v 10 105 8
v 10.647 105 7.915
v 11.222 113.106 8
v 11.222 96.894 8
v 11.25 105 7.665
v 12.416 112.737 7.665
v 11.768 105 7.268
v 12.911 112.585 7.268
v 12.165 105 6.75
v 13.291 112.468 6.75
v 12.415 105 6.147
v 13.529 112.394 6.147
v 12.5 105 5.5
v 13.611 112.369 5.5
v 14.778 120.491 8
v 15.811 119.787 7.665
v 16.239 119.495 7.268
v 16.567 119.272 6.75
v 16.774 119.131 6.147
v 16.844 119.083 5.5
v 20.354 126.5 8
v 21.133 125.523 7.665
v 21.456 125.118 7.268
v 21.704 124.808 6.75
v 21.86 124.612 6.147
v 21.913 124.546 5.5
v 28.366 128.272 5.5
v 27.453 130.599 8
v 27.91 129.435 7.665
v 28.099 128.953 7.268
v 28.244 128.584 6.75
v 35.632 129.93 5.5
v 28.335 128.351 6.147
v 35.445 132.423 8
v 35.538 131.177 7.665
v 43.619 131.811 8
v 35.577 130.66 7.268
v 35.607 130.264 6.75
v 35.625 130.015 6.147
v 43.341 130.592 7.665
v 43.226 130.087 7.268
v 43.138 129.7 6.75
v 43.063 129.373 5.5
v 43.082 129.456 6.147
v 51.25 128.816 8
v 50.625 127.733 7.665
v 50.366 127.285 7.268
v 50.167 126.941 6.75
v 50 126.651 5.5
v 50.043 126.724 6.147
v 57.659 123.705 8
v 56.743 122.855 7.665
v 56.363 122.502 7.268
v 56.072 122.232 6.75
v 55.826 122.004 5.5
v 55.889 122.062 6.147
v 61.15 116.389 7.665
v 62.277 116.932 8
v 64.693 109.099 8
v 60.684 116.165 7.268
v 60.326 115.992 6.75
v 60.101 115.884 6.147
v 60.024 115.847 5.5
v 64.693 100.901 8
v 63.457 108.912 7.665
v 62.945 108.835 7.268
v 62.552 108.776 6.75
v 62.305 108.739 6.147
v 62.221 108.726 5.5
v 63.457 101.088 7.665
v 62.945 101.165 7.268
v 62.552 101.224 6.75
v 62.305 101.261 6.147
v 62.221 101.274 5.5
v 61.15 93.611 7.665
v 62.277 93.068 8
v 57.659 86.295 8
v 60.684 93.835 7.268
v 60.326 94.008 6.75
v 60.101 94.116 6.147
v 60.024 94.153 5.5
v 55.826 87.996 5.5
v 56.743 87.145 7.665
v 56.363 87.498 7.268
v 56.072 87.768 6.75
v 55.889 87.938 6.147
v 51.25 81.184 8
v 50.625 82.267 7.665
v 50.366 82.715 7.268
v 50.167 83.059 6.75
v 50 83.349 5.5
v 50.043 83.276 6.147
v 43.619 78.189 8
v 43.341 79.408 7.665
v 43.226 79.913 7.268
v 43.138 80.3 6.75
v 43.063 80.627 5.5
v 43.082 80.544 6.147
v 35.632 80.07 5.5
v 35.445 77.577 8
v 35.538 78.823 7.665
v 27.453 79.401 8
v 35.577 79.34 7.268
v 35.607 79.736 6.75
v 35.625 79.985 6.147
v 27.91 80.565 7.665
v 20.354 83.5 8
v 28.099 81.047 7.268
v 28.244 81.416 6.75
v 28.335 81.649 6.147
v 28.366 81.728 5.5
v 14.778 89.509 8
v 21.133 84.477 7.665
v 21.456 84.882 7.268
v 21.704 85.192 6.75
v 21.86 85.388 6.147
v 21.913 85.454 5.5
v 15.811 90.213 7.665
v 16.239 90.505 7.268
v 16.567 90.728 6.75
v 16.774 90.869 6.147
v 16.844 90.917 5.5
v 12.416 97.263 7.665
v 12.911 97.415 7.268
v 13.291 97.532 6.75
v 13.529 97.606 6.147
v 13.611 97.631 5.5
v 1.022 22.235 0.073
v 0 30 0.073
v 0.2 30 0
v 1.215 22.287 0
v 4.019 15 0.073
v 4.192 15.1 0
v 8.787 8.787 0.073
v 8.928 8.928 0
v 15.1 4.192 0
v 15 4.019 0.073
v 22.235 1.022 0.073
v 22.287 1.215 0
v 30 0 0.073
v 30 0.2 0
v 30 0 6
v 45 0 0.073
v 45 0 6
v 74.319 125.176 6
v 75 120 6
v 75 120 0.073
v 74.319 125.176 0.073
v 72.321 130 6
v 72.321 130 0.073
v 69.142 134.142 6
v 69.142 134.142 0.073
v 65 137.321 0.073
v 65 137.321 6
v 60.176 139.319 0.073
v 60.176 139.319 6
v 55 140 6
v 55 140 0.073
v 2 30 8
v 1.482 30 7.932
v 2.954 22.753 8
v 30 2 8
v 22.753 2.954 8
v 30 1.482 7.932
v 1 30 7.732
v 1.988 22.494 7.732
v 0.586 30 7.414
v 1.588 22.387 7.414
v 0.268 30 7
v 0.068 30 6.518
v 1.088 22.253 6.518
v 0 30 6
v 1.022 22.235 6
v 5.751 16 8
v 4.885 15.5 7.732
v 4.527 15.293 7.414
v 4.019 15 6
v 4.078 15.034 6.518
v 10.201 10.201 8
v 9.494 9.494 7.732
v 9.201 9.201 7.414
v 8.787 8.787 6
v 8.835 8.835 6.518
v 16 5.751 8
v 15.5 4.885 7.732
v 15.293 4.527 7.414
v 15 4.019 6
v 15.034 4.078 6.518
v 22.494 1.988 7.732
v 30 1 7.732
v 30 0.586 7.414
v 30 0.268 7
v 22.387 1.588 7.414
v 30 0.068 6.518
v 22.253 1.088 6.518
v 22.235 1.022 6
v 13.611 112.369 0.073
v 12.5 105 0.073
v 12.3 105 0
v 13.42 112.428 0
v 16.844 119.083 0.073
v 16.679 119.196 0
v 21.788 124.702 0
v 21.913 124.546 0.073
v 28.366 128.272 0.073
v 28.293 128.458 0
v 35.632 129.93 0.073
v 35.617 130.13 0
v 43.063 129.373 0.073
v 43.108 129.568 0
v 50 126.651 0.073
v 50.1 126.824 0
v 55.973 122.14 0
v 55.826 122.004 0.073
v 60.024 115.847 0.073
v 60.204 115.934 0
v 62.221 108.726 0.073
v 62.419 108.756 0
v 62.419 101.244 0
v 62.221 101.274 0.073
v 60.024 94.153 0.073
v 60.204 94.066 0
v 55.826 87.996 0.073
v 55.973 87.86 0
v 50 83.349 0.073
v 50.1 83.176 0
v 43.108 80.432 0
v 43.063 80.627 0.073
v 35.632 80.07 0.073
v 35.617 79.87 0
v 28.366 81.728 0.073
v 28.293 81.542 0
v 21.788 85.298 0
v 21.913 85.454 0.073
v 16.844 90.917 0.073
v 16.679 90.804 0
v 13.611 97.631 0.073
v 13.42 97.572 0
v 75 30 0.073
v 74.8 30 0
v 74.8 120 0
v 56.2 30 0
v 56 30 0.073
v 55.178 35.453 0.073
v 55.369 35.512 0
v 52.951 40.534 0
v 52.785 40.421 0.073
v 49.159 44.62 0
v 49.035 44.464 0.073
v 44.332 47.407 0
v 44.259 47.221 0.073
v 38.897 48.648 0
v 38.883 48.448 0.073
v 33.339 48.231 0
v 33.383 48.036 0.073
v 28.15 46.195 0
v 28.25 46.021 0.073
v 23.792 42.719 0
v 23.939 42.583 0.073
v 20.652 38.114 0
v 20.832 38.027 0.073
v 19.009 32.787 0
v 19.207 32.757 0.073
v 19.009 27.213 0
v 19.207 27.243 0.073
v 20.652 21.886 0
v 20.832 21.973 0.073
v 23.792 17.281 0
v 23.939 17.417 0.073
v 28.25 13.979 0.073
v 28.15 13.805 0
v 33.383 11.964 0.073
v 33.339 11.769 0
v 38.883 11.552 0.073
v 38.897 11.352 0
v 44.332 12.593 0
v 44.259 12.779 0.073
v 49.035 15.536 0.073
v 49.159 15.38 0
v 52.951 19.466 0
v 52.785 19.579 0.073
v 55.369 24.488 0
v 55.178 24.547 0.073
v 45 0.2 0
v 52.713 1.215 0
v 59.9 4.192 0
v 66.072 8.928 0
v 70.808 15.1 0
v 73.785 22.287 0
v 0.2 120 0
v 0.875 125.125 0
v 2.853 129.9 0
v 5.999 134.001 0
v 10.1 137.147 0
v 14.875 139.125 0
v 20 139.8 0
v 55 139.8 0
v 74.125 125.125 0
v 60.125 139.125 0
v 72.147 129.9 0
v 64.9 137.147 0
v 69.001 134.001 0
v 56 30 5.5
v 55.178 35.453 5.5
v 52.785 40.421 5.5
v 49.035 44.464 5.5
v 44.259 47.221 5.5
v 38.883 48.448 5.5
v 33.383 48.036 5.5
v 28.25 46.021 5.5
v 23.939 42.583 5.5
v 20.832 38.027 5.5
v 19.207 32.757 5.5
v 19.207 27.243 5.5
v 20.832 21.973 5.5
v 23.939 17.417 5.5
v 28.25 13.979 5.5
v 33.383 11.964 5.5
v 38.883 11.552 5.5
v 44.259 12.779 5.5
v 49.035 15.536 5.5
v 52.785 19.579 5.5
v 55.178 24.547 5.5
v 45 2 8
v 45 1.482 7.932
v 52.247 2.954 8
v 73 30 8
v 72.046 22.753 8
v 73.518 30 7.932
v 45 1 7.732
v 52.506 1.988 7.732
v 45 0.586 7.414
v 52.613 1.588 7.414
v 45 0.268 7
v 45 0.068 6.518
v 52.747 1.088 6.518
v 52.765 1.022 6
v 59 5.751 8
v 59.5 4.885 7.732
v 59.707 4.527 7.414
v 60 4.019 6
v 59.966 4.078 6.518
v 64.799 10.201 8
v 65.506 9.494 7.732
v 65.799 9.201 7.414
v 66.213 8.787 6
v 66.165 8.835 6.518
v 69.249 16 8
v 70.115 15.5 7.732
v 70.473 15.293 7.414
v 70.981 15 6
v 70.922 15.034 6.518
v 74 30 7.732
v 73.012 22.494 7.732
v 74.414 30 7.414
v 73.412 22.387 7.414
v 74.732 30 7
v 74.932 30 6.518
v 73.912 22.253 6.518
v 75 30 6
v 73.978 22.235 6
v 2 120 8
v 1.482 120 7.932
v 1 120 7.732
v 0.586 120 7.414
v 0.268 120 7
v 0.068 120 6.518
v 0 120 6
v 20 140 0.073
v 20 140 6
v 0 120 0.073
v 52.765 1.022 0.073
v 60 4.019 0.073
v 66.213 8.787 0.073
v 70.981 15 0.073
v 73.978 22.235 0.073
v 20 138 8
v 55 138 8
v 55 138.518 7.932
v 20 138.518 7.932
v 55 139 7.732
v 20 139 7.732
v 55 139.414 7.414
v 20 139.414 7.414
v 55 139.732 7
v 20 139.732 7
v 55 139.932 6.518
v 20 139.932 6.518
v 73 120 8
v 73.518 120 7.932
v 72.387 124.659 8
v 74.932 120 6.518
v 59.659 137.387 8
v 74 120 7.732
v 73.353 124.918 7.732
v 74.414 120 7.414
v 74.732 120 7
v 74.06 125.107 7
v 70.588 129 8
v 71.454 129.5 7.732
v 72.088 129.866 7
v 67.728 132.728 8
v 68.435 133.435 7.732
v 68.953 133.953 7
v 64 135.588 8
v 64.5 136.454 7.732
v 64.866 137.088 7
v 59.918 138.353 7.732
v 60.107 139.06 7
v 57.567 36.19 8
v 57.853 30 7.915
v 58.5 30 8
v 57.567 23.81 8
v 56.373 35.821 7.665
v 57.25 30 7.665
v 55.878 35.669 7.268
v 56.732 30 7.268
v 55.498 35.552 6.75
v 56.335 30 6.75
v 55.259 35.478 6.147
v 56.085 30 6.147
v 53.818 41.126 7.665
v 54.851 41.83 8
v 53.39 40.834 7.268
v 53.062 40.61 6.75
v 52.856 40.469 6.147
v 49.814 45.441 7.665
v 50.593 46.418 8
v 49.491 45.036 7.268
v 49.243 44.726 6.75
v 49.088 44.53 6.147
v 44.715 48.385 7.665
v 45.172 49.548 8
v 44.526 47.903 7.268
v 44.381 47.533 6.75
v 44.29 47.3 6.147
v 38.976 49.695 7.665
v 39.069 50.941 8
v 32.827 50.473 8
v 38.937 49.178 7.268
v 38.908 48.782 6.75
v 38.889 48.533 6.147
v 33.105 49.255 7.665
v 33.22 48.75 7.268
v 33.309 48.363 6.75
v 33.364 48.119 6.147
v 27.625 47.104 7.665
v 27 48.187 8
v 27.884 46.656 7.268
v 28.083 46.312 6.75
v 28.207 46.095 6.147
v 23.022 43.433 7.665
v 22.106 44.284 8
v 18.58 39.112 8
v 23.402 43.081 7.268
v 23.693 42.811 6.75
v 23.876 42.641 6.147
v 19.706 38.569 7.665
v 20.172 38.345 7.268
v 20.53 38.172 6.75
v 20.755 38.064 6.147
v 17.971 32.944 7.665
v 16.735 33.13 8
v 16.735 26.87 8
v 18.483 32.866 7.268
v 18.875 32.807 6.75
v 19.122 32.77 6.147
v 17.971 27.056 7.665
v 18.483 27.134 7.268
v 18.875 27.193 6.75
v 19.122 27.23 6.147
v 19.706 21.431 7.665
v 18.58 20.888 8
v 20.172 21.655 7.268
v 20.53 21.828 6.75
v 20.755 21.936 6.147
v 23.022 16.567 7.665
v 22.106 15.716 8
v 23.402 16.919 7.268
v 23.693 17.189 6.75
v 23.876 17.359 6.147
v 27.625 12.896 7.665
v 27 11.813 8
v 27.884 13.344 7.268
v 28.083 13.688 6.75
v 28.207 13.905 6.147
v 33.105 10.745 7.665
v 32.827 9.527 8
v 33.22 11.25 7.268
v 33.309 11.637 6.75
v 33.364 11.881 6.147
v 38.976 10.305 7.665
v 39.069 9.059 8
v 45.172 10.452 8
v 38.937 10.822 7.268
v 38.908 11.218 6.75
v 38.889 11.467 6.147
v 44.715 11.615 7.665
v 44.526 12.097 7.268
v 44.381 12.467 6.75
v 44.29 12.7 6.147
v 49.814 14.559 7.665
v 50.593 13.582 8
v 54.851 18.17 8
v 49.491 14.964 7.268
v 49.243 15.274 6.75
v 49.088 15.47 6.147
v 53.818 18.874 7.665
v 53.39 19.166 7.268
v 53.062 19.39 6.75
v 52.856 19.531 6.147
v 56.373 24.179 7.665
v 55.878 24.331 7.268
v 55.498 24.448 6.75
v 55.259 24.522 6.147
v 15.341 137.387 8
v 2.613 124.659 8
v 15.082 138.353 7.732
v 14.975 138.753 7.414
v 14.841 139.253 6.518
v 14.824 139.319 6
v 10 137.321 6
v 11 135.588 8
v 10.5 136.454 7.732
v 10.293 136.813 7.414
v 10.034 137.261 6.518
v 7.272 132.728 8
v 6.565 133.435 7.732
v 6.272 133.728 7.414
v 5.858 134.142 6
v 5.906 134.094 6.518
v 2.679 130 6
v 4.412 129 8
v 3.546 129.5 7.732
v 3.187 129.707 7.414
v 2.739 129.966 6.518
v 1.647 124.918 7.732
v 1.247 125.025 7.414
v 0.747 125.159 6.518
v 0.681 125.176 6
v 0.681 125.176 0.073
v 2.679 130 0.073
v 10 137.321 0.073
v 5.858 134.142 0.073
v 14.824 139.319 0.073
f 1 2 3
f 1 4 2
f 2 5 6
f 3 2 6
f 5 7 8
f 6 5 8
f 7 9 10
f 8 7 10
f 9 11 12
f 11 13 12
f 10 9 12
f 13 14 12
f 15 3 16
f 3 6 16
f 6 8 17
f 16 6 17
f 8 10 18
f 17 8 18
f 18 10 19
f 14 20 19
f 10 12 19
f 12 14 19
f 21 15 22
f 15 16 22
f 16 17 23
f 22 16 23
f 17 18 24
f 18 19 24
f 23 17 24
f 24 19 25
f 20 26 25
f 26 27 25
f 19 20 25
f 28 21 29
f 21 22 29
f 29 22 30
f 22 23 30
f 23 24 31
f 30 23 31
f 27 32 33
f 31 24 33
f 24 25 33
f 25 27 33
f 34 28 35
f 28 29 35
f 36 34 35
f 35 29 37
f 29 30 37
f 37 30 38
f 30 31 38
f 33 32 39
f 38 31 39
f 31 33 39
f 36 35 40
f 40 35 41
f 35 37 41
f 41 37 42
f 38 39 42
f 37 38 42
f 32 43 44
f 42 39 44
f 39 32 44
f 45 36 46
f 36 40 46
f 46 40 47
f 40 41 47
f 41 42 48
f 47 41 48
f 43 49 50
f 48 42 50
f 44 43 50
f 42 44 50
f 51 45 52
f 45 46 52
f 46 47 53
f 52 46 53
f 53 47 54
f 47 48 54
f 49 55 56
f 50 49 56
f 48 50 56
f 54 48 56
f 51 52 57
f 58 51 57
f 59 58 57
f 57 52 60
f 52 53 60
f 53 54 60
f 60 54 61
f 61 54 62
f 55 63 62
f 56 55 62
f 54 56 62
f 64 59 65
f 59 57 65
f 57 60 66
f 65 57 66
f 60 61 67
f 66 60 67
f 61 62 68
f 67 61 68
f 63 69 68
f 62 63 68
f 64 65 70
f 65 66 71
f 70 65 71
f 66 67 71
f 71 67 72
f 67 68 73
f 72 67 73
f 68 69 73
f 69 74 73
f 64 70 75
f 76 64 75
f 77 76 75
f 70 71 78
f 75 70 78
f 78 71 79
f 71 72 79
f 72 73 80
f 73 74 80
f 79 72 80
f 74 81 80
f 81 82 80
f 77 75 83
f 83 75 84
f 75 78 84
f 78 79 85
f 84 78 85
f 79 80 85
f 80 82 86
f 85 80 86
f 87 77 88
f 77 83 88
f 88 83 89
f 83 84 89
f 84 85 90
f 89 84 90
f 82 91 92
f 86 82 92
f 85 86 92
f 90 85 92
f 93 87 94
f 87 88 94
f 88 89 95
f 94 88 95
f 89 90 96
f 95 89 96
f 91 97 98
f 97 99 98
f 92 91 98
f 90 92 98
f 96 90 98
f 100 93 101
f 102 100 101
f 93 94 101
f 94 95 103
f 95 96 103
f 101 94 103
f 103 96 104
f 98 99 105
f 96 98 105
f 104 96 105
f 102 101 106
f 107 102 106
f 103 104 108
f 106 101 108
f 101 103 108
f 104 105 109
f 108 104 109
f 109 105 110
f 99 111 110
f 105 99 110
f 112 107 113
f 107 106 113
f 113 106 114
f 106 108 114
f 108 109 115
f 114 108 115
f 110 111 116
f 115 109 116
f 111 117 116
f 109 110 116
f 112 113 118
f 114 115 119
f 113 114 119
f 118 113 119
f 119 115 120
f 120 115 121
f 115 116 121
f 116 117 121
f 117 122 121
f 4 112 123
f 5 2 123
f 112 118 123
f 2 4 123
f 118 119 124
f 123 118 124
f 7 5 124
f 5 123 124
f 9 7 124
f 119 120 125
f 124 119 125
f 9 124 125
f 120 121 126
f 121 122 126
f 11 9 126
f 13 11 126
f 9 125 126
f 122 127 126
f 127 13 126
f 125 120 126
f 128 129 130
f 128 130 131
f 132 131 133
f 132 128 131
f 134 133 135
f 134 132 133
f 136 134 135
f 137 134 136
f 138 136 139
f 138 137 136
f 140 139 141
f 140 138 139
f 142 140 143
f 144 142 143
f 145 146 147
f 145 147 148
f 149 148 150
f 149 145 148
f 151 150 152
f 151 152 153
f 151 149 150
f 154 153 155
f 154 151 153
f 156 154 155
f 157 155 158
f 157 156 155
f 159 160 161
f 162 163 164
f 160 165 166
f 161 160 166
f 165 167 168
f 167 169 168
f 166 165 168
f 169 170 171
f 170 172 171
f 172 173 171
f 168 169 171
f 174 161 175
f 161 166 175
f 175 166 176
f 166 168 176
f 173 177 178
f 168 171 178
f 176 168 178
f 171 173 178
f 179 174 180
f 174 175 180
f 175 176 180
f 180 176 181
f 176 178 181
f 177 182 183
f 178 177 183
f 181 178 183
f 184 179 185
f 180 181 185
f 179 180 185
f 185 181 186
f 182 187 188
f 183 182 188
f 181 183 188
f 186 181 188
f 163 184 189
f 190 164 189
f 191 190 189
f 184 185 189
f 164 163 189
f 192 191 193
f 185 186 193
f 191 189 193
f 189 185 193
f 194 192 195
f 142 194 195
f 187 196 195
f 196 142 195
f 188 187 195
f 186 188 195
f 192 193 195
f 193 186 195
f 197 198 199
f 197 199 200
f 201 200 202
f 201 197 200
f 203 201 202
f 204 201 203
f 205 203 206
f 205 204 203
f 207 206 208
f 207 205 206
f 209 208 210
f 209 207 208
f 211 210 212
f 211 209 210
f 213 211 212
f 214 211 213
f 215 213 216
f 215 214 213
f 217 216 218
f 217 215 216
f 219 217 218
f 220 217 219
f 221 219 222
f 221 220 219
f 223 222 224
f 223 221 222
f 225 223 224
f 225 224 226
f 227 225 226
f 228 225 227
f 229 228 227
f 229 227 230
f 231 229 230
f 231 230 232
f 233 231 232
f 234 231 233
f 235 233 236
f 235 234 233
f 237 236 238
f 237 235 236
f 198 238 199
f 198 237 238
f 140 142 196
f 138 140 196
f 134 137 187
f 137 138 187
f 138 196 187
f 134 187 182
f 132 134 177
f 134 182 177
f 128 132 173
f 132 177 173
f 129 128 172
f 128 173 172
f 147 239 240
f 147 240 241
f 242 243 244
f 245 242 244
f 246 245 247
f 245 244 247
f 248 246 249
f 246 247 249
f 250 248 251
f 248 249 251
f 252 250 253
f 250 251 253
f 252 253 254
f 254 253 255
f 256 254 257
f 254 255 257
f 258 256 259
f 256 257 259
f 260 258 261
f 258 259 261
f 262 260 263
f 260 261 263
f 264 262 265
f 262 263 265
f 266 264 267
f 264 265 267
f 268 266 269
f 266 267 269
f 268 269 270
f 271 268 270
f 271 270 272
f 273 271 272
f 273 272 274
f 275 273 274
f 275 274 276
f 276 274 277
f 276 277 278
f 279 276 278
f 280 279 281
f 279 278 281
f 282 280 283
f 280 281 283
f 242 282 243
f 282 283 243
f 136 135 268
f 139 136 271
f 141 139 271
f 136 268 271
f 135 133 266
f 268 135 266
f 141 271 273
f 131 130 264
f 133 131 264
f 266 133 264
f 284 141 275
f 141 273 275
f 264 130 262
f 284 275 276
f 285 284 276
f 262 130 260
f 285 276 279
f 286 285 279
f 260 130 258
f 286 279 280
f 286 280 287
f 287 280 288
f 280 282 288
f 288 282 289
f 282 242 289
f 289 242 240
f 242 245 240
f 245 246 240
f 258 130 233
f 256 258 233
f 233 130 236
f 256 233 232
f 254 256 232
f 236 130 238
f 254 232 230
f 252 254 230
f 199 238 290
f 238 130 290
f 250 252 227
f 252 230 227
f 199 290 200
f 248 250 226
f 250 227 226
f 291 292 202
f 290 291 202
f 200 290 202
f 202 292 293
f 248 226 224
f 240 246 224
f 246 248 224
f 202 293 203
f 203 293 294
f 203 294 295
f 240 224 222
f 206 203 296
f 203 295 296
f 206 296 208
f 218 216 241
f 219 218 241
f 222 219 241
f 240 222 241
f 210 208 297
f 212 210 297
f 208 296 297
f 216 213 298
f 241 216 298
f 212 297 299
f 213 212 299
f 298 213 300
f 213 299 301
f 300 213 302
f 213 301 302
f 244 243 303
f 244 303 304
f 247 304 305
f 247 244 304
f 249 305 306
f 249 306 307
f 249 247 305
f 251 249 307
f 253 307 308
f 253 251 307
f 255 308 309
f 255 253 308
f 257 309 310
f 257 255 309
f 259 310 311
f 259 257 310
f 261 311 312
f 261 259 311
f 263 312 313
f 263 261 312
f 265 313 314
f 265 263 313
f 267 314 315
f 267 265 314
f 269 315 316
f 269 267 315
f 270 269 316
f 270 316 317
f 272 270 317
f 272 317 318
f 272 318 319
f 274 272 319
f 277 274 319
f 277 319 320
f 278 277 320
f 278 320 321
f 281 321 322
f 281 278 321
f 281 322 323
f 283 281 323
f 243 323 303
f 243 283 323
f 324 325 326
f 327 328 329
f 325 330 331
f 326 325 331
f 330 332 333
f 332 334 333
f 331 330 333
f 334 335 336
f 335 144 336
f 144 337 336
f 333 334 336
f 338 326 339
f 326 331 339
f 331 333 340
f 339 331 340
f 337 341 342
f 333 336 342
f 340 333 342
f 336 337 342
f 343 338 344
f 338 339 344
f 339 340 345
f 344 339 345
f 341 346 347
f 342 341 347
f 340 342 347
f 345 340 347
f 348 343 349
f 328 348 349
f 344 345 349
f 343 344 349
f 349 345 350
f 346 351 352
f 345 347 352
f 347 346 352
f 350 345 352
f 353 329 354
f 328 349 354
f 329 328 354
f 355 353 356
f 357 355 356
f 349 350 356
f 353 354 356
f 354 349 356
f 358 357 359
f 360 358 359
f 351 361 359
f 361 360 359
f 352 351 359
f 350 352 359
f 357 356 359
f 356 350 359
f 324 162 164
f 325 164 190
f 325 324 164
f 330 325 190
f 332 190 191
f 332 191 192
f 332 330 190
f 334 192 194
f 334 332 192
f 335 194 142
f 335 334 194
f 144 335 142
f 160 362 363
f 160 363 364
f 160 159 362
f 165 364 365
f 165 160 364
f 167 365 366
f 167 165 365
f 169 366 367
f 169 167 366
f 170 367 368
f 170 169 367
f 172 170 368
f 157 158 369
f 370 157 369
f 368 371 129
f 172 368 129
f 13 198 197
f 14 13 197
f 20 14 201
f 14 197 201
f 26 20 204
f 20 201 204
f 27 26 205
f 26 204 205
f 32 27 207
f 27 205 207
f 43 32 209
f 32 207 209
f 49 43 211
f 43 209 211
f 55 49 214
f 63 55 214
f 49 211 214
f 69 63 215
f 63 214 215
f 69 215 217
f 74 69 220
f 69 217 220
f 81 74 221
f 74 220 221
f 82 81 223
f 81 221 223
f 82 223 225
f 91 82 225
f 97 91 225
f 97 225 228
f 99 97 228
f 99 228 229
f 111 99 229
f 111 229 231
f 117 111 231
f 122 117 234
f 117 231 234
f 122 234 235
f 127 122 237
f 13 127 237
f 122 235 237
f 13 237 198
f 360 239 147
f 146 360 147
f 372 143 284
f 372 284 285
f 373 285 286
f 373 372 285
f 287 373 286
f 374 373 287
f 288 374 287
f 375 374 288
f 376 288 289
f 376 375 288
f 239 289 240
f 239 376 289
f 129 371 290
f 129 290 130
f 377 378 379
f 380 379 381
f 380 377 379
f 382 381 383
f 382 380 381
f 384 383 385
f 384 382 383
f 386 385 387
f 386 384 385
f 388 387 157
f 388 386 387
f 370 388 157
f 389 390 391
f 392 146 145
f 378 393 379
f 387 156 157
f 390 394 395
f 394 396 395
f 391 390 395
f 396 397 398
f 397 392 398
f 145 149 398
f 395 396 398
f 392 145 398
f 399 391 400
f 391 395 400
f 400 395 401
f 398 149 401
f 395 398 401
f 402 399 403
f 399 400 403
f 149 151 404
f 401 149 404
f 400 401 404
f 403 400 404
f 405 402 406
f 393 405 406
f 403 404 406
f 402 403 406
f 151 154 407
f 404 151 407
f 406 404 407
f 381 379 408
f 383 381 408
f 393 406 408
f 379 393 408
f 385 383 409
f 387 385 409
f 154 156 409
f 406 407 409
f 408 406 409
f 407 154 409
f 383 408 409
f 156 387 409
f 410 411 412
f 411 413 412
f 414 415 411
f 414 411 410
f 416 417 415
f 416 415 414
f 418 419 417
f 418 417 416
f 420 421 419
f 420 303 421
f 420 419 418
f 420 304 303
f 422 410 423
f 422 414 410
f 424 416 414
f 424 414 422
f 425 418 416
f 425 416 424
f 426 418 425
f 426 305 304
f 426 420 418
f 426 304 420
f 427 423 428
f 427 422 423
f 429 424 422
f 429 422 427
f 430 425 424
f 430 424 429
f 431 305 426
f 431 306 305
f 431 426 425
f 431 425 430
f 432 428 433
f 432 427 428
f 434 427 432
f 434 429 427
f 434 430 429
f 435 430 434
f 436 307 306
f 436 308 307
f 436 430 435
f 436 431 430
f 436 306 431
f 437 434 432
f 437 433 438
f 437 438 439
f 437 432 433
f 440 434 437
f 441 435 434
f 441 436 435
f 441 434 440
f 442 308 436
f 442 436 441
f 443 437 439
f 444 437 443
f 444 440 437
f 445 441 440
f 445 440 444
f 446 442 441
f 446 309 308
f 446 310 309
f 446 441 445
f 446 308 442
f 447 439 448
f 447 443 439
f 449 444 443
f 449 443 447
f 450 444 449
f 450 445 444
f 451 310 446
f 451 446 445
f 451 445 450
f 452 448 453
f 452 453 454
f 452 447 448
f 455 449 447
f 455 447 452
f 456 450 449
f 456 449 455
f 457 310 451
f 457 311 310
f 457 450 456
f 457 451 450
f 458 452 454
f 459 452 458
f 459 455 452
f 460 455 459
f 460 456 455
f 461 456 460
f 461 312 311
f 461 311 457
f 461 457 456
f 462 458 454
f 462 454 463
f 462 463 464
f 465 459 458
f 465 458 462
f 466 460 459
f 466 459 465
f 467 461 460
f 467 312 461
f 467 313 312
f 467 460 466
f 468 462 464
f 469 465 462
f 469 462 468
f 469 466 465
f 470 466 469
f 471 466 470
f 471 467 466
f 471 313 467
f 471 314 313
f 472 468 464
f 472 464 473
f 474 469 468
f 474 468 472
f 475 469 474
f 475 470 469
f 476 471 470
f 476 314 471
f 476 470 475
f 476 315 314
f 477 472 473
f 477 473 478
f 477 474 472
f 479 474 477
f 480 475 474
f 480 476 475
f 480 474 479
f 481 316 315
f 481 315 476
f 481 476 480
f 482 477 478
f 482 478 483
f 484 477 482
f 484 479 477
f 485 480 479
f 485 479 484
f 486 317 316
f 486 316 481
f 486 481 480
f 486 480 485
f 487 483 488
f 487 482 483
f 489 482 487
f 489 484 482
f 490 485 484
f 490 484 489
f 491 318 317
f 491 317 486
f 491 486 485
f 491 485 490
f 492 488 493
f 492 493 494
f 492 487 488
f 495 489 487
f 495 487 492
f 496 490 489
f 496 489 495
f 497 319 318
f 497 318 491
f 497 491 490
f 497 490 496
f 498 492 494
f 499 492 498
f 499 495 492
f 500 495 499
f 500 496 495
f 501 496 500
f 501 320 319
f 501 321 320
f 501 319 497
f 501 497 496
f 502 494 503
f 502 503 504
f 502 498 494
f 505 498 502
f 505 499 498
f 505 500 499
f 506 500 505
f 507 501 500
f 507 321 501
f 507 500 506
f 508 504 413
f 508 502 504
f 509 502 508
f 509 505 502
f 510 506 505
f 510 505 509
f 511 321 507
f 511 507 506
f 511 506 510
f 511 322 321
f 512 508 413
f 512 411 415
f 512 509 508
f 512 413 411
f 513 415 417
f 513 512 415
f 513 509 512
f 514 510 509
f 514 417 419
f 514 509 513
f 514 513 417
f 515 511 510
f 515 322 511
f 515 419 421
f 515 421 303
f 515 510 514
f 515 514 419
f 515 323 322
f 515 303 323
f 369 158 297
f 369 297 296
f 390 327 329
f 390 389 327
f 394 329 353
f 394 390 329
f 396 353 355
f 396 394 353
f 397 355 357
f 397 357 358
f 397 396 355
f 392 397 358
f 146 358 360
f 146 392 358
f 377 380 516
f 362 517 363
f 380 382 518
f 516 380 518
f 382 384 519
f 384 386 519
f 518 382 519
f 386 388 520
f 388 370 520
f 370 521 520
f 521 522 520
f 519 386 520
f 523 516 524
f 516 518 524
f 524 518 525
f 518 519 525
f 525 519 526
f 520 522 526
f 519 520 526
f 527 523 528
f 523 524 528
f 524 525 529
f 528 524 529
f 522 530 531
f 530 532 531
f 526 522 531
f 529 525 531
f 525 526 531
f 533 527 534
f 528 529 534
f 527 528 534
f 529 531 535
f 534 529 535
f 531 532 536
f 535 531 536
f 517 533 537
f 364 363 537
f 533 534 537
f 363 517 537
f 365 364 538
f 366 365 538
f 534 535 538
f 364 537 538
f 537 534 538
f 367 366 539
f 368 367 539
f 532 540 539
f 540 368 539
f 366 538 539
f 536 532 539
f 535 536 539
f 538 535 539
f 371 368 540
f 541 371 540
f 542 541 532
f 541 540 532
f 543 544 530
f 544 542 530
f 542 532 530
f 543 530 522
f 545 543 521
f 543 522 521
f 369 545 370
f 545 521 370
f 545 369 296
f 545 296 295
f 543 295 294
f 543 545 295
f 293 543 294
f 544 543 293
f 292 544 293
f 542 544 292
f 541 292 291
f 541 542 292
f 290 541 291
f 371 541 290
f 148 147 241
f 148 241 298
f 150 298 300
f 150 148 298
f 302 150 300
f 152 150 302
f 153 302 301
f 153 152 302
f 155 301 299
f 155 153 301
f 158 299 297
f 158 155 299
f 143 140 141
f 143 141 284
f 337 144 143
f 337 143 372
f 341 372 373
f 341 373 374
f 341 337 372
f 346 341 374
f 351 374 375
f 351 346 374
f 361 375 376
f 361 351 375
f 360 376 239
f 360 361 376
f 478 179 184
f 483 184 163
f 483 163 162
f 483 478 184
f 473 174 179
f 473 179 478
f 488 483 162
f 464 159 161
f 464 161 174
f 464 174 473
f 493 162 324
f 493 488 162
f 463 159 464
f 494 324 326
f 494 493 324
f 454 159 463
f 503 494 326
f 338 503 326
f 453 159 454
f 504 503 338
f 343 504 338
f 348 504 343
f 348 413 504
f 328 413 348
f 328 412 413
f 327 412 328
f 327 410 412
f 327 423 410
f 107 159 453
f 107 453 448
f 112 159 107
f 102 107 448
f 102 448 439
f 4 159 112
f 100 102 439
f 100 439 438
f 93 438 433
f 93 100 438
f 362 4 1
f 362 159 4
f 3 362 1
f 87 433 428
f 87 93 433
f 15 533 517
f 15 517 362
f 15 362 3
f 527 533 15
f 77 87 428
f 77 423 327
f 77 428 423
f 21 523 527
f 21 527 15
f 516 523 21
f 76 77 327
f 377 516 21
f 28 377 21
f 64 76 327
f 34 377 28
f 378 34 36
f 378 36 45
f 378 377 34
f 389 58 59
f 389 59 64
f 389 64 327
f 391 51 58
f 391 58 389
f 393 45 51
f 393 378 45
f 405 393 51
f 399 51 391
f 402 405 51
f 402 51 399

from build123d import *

# Parameters (mm, degrees)
F0_R     = 18.5
F1_DEPTH = 8
F2_R     = 30
F3_R     = 2.5
F4_R     = 20
F5_R     = 2
F6_SIZE2 = 0.0727940469
F6_SIZE  = 0.2


with BuildPart() as f1:
    # F0 (on Top) → F1 (new body)
    with BuildSketch(Plane.XY):
        with BuildLine():
            Line((0, 105), (0, 0))
            Line((0, 0), (75, 0))
            Line((75, 0), (75, 105))
            Line((75, 105), (62.5, 105))
            ThreePointArc((62.5, 105), (37.5, 80), (12.5, 105))
            Line((12.5, 105), (0, 105))
        make_face()
        with Locations((37.5, 30)):
            Circle(F0_R, mode=Mode.SUBTRACT)
        with BuildLine():
            Line((0, 140), (0, 105))
            Line((0, 105), (12.5, 105))
            ThreePointArc((12.5, 105), (37.5, 130), (62.5, 105))
            Line((62.5, 105), (75, 105))
            Line((75, 105), (75, 140))
            Line((75, 140), (0, 140))
        make_face()
    extrude(amount=F1_DEPTH)

    # F2
    f2_edges = [f1.edges().sort_by_distance(p)[0] for p in [
        (75, 0, 4),
        (0, 0, 4),
    ]]
    fillet(f2_edges, radius=F2_R)

    # F3
    f3_edges = [f1.edges().sort_by_distance(p)[0] for p in [
        (62.5, 105, 8),
        (19, 30, 8),
    ]]
    fillet(f3_edges, radius=F3_R)

    # F4
    f4_edges = [f1.edges().sort_by_distance(p)[0] for p in [
        (0, 140, 4),
        (75, 140, 4),
    ]]
    fillet(f4_edges, radius=F4_R)

    # F5
    f5_edges = [f1.edges().sort_by_distance(p)[0] for p in [
        (69.142136, 134.142136, 8),
        (37.5, 140, 8),
        (5.857864, 134.142136, 8),
        (0, 75, 8),
        (75, 75, 8),
        (66.213203, 8.786797, 8),
        (37.5, 0, 8),
        (8.786797, 8.786797, 8),
    ]]
    fillet(f5_edges, radius=F5_R)

    # F6
    f6_edges = [f1.edges().sort_by_distance(p)[0] for p in [
        (0, 75, 0),
        (5.857864, 134.142136, 0),
        (8.786797, 8.786797, 0),
        (37.5, 140, 0),
        (37.5, 0, 0),
        (69.142136, 134.142136, 0),
        (66.213203, 8.786797, 0),
        (75, 75, 0),
        (62.5, 105, 0),
        (19, 30, 0),
    ]]
    f6_side = f1.faces().sort_by_distance((37.5, 68.187347, 0))[0]
    chamfer(f6_edges, length=F6_SIZE, length2=F6_SIZE2, reference=f6_side)


solid = f1.part
